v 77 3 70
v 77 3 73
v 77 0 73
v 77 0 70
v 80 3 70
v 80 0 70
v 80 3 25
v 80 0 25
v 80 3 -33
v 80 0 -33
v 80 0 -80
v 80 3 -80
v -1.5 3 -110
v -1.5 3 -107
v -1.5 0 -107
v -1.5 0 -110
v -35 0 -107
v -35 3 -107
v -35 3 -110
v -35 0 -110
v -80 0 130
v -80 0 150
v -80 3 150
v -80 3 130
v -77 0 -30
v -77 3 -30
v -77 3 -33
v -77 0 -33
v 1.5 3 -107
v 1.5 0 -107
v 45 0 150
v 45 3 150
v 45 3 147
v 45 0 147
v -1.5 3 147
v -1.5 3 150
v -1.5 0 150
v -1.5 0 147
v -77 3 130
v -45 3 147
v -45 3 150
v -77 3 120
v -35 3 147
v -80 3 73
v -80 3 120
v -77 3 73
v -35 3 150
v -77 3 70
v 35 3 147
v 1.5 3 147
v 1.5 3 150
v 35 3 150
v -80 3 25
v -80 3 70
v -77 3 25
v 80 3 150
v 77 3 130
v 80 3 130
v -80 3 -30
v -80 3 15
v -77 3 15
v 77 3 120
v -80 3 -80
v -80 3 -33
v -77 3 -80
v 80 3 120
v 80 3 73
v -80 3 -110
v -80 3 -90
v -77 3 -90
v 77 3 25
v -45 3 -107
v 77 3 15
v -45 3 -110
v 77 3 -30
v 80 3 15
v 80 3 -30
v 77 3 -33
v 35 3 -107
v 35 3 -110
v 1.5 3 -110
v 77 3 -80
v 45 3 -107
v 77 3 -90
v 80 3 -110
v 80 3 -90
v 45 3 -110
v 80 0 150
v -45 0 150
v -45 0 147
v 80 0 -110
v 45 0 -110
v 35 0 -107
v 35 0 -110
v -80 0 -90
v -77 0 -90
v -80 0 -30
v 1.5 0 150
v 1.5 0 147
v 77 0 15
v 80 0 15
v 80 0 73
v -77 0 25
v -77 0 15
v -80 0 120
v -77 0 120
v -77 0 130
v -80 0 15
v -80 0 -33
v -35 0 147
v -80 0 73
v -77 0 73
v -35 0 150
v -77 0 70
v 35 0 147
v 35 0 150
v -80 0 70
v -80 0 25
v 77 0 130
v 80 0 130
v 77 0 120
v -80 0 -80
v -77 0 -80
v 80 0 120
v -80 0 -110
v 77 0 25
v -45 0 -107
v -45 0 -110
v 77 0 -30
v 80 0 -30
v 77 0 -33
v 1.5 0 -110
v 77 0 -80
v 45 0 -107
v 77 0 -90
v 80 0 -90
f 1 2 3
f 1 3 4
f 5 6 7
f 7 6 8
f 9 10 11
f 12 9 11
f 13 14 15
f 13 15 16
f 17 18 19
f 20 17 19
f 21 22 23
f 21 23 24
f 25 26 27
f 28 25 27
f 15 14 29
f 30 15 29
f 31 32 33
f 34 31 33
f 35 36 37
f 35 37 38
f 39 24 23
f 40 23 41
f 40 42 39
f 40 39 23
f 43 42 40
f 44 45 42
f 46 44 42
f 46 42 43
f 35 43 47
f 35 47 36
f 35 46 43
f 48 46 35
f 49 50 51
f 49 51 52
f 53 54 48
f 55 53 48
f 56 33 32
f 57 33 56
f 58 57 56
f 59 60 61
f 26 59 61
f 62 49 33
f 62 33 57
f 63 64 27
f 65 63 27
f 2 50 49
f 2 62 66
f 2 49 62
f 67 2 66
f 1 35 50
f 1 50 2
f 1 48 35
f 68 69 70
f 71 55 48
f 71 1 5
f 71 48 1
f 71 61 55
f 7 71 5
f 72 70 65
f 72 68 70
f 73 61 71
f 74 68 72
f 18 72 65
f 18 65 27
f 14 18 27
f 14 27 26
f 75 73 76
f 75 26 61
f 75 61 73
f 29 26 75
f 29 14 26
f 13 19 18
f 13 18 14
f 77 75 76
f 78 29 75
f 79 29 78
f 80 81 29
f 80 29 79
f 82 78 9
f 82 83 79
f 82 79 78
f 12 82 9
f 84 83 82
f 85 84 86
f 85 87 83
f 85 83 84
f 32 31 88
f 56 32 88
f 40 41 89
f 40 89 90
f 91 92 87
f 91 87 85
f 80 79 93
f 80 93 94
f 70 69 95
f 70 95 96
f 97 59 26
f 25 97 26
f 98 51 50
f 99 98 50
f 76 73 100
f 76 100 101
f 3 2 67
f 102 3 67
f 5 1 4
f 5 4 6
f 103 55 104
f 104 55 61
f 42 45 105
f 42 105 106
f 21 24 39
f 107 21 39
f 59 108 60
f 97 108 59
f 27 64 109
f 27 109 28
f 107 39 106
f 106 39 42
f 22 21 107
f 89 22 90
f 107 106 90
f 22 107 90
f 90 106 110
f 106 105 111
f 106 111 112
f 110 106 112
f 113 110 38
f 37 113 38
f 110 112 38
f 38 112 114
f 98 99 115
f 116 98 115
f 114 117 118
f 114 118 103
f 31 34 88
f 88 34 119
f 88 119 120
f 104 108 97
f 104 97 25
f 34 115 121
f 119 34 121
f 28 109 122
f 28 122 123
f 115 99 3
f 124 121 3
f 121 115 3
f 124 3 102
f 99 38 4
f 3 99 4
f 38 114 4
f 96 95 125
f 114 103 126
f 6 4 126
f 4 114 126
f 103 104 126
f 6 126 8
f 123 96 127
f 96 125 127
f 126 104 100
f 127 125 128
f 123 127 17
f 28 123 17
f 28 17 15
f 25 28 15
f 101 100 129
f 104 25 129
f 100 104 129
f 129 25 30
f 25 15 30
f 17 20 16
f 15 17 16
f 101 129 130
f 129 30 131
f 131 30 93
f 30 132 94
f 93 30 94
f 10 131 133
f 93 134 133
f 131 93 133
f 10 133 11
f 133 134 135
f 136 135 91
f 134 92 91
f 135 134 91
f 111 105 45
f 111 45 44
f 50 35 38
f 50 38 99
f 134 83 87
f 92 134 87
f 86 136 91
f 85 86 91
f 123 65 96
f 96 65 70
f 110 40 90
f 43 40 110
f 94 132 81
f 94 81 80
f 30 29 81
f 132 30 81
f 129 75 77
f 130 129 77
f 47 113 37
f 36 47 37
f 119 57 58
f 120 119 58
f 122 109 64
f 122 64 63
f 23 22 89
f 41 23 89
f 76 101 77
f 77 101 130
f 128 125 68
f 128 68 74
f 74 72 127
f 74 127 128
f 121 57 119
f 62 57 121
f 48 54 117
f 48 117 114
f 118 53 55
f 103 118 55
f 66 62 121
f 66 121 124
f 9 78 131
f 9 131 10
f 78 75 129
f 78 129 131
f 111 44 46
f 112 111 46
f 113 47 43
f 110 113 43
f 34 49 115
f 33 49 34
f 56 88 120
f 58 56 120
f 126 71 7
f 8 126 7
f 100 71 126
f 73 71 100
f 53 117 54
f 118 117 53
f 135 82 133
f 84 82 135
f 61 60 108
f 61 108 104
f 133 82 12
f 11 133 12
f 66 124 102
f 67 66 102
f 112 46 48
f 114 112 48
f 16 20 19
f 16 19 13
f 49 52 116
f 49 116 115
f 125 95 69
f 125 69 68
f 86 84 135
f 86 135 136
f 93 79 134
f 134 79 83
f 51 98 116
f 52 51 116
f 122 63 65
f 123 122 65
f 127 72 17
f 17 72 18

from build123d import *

# Parameters (mm, degrees)
SKETCH1_W           = 160
SKETCH1_H           = 260
BOSS_EXTRUDE1_DEPTH = 3
SKETCH7_W           = 3
SKETCH7_H           = 3
SKETCH7_W_2         = 10
SKETCH7_H_2         = 10
CUT_EXTRUDE2_DEPTH  = 171.026468528


with BuildPart() as part:
    # Sketch1 → Boss-Extrude1 (new body)
    with BuildSketch(Plane(origin=(0, 0, 0), x_dir=(1, 0, 0), z_dir=(0, 1, 0))):
        with Locations((0, -20)):
            Rectangle(SKETCH1_W, SKETCH1_H)
    extrude(amount=BOSS_EXTRUDE1_DEPTH)

    # Sketch7 → Cut-Extrude2 (cut, through all)
    with BuildSketch(Plane(origin=(0, 3, 0), x_dir=(1, 0, 0), z_dir=(0, 1, 0))):
        with Locations((0, 108.5)):
            Rectangle(SKETCH7_W, SKETCH7_H)
        with Locations((40, 108.5)):
            Rectangle(SKETCH7_W_2, SKETCH7_H)
        with Locations((-40, 108.5)):
            Rectangle(SKETCH7_W_2, SKETCH7_H)
        with Locations((40, -148.5)):
            Rectangle(SKETCH7_W_2, SKETCH7_H)
        with Locations((-40, -148.5)):
            Rectangle(SKETCH7_W_2, SKETCH7_H)
        with Locations((0, -148.5)):
            Rectangle(SKETCH7_W, SKETCH7_H)
        with Locations((-78.5, -125)):
            Rectangle(SKETCH7_W, SKETCH7_H_2)
        with Locations((-78.5, -20)):
            Rectangle(SKETCH7_W, SKETCH7_H_2)
        with Locations((-78.5, 85)):
            Rectangle(SKETCH7_W, SKETCH7_H_2)
        with Locations((-78.5, -71.5)):
            Rectangle(SKETCH7_W, SKETCH7_H)
        with Locations((-78.5, 31.5)):
            Rectangle(SKETCH7_W, SKETCH7_H)
        with Locations((78.5, -125)):
            Rectangle(SKETCH7_W, SKETCH7_H_2)
        with Locations((78.5, -71.5)):
            Rectangle(SKETCH7_W, SKETCH7_H)
        with Locations((78.5, -20)):
            Rectangle(SKETCH7_W, SKETCH7_H_2)
        with Locations((78.5, 31.5)):
            Rectangle(SKETCH7_W, SKETCH7_H)
        with Locations((78.5, 85)):
            Rectangle(SKETCH7_W, SKETCH7_H_2)
    extrude(amount=-CUT_EXTRUDE2_DEPTH, mode=Mode.SUBTRACT)


solid = part.part
